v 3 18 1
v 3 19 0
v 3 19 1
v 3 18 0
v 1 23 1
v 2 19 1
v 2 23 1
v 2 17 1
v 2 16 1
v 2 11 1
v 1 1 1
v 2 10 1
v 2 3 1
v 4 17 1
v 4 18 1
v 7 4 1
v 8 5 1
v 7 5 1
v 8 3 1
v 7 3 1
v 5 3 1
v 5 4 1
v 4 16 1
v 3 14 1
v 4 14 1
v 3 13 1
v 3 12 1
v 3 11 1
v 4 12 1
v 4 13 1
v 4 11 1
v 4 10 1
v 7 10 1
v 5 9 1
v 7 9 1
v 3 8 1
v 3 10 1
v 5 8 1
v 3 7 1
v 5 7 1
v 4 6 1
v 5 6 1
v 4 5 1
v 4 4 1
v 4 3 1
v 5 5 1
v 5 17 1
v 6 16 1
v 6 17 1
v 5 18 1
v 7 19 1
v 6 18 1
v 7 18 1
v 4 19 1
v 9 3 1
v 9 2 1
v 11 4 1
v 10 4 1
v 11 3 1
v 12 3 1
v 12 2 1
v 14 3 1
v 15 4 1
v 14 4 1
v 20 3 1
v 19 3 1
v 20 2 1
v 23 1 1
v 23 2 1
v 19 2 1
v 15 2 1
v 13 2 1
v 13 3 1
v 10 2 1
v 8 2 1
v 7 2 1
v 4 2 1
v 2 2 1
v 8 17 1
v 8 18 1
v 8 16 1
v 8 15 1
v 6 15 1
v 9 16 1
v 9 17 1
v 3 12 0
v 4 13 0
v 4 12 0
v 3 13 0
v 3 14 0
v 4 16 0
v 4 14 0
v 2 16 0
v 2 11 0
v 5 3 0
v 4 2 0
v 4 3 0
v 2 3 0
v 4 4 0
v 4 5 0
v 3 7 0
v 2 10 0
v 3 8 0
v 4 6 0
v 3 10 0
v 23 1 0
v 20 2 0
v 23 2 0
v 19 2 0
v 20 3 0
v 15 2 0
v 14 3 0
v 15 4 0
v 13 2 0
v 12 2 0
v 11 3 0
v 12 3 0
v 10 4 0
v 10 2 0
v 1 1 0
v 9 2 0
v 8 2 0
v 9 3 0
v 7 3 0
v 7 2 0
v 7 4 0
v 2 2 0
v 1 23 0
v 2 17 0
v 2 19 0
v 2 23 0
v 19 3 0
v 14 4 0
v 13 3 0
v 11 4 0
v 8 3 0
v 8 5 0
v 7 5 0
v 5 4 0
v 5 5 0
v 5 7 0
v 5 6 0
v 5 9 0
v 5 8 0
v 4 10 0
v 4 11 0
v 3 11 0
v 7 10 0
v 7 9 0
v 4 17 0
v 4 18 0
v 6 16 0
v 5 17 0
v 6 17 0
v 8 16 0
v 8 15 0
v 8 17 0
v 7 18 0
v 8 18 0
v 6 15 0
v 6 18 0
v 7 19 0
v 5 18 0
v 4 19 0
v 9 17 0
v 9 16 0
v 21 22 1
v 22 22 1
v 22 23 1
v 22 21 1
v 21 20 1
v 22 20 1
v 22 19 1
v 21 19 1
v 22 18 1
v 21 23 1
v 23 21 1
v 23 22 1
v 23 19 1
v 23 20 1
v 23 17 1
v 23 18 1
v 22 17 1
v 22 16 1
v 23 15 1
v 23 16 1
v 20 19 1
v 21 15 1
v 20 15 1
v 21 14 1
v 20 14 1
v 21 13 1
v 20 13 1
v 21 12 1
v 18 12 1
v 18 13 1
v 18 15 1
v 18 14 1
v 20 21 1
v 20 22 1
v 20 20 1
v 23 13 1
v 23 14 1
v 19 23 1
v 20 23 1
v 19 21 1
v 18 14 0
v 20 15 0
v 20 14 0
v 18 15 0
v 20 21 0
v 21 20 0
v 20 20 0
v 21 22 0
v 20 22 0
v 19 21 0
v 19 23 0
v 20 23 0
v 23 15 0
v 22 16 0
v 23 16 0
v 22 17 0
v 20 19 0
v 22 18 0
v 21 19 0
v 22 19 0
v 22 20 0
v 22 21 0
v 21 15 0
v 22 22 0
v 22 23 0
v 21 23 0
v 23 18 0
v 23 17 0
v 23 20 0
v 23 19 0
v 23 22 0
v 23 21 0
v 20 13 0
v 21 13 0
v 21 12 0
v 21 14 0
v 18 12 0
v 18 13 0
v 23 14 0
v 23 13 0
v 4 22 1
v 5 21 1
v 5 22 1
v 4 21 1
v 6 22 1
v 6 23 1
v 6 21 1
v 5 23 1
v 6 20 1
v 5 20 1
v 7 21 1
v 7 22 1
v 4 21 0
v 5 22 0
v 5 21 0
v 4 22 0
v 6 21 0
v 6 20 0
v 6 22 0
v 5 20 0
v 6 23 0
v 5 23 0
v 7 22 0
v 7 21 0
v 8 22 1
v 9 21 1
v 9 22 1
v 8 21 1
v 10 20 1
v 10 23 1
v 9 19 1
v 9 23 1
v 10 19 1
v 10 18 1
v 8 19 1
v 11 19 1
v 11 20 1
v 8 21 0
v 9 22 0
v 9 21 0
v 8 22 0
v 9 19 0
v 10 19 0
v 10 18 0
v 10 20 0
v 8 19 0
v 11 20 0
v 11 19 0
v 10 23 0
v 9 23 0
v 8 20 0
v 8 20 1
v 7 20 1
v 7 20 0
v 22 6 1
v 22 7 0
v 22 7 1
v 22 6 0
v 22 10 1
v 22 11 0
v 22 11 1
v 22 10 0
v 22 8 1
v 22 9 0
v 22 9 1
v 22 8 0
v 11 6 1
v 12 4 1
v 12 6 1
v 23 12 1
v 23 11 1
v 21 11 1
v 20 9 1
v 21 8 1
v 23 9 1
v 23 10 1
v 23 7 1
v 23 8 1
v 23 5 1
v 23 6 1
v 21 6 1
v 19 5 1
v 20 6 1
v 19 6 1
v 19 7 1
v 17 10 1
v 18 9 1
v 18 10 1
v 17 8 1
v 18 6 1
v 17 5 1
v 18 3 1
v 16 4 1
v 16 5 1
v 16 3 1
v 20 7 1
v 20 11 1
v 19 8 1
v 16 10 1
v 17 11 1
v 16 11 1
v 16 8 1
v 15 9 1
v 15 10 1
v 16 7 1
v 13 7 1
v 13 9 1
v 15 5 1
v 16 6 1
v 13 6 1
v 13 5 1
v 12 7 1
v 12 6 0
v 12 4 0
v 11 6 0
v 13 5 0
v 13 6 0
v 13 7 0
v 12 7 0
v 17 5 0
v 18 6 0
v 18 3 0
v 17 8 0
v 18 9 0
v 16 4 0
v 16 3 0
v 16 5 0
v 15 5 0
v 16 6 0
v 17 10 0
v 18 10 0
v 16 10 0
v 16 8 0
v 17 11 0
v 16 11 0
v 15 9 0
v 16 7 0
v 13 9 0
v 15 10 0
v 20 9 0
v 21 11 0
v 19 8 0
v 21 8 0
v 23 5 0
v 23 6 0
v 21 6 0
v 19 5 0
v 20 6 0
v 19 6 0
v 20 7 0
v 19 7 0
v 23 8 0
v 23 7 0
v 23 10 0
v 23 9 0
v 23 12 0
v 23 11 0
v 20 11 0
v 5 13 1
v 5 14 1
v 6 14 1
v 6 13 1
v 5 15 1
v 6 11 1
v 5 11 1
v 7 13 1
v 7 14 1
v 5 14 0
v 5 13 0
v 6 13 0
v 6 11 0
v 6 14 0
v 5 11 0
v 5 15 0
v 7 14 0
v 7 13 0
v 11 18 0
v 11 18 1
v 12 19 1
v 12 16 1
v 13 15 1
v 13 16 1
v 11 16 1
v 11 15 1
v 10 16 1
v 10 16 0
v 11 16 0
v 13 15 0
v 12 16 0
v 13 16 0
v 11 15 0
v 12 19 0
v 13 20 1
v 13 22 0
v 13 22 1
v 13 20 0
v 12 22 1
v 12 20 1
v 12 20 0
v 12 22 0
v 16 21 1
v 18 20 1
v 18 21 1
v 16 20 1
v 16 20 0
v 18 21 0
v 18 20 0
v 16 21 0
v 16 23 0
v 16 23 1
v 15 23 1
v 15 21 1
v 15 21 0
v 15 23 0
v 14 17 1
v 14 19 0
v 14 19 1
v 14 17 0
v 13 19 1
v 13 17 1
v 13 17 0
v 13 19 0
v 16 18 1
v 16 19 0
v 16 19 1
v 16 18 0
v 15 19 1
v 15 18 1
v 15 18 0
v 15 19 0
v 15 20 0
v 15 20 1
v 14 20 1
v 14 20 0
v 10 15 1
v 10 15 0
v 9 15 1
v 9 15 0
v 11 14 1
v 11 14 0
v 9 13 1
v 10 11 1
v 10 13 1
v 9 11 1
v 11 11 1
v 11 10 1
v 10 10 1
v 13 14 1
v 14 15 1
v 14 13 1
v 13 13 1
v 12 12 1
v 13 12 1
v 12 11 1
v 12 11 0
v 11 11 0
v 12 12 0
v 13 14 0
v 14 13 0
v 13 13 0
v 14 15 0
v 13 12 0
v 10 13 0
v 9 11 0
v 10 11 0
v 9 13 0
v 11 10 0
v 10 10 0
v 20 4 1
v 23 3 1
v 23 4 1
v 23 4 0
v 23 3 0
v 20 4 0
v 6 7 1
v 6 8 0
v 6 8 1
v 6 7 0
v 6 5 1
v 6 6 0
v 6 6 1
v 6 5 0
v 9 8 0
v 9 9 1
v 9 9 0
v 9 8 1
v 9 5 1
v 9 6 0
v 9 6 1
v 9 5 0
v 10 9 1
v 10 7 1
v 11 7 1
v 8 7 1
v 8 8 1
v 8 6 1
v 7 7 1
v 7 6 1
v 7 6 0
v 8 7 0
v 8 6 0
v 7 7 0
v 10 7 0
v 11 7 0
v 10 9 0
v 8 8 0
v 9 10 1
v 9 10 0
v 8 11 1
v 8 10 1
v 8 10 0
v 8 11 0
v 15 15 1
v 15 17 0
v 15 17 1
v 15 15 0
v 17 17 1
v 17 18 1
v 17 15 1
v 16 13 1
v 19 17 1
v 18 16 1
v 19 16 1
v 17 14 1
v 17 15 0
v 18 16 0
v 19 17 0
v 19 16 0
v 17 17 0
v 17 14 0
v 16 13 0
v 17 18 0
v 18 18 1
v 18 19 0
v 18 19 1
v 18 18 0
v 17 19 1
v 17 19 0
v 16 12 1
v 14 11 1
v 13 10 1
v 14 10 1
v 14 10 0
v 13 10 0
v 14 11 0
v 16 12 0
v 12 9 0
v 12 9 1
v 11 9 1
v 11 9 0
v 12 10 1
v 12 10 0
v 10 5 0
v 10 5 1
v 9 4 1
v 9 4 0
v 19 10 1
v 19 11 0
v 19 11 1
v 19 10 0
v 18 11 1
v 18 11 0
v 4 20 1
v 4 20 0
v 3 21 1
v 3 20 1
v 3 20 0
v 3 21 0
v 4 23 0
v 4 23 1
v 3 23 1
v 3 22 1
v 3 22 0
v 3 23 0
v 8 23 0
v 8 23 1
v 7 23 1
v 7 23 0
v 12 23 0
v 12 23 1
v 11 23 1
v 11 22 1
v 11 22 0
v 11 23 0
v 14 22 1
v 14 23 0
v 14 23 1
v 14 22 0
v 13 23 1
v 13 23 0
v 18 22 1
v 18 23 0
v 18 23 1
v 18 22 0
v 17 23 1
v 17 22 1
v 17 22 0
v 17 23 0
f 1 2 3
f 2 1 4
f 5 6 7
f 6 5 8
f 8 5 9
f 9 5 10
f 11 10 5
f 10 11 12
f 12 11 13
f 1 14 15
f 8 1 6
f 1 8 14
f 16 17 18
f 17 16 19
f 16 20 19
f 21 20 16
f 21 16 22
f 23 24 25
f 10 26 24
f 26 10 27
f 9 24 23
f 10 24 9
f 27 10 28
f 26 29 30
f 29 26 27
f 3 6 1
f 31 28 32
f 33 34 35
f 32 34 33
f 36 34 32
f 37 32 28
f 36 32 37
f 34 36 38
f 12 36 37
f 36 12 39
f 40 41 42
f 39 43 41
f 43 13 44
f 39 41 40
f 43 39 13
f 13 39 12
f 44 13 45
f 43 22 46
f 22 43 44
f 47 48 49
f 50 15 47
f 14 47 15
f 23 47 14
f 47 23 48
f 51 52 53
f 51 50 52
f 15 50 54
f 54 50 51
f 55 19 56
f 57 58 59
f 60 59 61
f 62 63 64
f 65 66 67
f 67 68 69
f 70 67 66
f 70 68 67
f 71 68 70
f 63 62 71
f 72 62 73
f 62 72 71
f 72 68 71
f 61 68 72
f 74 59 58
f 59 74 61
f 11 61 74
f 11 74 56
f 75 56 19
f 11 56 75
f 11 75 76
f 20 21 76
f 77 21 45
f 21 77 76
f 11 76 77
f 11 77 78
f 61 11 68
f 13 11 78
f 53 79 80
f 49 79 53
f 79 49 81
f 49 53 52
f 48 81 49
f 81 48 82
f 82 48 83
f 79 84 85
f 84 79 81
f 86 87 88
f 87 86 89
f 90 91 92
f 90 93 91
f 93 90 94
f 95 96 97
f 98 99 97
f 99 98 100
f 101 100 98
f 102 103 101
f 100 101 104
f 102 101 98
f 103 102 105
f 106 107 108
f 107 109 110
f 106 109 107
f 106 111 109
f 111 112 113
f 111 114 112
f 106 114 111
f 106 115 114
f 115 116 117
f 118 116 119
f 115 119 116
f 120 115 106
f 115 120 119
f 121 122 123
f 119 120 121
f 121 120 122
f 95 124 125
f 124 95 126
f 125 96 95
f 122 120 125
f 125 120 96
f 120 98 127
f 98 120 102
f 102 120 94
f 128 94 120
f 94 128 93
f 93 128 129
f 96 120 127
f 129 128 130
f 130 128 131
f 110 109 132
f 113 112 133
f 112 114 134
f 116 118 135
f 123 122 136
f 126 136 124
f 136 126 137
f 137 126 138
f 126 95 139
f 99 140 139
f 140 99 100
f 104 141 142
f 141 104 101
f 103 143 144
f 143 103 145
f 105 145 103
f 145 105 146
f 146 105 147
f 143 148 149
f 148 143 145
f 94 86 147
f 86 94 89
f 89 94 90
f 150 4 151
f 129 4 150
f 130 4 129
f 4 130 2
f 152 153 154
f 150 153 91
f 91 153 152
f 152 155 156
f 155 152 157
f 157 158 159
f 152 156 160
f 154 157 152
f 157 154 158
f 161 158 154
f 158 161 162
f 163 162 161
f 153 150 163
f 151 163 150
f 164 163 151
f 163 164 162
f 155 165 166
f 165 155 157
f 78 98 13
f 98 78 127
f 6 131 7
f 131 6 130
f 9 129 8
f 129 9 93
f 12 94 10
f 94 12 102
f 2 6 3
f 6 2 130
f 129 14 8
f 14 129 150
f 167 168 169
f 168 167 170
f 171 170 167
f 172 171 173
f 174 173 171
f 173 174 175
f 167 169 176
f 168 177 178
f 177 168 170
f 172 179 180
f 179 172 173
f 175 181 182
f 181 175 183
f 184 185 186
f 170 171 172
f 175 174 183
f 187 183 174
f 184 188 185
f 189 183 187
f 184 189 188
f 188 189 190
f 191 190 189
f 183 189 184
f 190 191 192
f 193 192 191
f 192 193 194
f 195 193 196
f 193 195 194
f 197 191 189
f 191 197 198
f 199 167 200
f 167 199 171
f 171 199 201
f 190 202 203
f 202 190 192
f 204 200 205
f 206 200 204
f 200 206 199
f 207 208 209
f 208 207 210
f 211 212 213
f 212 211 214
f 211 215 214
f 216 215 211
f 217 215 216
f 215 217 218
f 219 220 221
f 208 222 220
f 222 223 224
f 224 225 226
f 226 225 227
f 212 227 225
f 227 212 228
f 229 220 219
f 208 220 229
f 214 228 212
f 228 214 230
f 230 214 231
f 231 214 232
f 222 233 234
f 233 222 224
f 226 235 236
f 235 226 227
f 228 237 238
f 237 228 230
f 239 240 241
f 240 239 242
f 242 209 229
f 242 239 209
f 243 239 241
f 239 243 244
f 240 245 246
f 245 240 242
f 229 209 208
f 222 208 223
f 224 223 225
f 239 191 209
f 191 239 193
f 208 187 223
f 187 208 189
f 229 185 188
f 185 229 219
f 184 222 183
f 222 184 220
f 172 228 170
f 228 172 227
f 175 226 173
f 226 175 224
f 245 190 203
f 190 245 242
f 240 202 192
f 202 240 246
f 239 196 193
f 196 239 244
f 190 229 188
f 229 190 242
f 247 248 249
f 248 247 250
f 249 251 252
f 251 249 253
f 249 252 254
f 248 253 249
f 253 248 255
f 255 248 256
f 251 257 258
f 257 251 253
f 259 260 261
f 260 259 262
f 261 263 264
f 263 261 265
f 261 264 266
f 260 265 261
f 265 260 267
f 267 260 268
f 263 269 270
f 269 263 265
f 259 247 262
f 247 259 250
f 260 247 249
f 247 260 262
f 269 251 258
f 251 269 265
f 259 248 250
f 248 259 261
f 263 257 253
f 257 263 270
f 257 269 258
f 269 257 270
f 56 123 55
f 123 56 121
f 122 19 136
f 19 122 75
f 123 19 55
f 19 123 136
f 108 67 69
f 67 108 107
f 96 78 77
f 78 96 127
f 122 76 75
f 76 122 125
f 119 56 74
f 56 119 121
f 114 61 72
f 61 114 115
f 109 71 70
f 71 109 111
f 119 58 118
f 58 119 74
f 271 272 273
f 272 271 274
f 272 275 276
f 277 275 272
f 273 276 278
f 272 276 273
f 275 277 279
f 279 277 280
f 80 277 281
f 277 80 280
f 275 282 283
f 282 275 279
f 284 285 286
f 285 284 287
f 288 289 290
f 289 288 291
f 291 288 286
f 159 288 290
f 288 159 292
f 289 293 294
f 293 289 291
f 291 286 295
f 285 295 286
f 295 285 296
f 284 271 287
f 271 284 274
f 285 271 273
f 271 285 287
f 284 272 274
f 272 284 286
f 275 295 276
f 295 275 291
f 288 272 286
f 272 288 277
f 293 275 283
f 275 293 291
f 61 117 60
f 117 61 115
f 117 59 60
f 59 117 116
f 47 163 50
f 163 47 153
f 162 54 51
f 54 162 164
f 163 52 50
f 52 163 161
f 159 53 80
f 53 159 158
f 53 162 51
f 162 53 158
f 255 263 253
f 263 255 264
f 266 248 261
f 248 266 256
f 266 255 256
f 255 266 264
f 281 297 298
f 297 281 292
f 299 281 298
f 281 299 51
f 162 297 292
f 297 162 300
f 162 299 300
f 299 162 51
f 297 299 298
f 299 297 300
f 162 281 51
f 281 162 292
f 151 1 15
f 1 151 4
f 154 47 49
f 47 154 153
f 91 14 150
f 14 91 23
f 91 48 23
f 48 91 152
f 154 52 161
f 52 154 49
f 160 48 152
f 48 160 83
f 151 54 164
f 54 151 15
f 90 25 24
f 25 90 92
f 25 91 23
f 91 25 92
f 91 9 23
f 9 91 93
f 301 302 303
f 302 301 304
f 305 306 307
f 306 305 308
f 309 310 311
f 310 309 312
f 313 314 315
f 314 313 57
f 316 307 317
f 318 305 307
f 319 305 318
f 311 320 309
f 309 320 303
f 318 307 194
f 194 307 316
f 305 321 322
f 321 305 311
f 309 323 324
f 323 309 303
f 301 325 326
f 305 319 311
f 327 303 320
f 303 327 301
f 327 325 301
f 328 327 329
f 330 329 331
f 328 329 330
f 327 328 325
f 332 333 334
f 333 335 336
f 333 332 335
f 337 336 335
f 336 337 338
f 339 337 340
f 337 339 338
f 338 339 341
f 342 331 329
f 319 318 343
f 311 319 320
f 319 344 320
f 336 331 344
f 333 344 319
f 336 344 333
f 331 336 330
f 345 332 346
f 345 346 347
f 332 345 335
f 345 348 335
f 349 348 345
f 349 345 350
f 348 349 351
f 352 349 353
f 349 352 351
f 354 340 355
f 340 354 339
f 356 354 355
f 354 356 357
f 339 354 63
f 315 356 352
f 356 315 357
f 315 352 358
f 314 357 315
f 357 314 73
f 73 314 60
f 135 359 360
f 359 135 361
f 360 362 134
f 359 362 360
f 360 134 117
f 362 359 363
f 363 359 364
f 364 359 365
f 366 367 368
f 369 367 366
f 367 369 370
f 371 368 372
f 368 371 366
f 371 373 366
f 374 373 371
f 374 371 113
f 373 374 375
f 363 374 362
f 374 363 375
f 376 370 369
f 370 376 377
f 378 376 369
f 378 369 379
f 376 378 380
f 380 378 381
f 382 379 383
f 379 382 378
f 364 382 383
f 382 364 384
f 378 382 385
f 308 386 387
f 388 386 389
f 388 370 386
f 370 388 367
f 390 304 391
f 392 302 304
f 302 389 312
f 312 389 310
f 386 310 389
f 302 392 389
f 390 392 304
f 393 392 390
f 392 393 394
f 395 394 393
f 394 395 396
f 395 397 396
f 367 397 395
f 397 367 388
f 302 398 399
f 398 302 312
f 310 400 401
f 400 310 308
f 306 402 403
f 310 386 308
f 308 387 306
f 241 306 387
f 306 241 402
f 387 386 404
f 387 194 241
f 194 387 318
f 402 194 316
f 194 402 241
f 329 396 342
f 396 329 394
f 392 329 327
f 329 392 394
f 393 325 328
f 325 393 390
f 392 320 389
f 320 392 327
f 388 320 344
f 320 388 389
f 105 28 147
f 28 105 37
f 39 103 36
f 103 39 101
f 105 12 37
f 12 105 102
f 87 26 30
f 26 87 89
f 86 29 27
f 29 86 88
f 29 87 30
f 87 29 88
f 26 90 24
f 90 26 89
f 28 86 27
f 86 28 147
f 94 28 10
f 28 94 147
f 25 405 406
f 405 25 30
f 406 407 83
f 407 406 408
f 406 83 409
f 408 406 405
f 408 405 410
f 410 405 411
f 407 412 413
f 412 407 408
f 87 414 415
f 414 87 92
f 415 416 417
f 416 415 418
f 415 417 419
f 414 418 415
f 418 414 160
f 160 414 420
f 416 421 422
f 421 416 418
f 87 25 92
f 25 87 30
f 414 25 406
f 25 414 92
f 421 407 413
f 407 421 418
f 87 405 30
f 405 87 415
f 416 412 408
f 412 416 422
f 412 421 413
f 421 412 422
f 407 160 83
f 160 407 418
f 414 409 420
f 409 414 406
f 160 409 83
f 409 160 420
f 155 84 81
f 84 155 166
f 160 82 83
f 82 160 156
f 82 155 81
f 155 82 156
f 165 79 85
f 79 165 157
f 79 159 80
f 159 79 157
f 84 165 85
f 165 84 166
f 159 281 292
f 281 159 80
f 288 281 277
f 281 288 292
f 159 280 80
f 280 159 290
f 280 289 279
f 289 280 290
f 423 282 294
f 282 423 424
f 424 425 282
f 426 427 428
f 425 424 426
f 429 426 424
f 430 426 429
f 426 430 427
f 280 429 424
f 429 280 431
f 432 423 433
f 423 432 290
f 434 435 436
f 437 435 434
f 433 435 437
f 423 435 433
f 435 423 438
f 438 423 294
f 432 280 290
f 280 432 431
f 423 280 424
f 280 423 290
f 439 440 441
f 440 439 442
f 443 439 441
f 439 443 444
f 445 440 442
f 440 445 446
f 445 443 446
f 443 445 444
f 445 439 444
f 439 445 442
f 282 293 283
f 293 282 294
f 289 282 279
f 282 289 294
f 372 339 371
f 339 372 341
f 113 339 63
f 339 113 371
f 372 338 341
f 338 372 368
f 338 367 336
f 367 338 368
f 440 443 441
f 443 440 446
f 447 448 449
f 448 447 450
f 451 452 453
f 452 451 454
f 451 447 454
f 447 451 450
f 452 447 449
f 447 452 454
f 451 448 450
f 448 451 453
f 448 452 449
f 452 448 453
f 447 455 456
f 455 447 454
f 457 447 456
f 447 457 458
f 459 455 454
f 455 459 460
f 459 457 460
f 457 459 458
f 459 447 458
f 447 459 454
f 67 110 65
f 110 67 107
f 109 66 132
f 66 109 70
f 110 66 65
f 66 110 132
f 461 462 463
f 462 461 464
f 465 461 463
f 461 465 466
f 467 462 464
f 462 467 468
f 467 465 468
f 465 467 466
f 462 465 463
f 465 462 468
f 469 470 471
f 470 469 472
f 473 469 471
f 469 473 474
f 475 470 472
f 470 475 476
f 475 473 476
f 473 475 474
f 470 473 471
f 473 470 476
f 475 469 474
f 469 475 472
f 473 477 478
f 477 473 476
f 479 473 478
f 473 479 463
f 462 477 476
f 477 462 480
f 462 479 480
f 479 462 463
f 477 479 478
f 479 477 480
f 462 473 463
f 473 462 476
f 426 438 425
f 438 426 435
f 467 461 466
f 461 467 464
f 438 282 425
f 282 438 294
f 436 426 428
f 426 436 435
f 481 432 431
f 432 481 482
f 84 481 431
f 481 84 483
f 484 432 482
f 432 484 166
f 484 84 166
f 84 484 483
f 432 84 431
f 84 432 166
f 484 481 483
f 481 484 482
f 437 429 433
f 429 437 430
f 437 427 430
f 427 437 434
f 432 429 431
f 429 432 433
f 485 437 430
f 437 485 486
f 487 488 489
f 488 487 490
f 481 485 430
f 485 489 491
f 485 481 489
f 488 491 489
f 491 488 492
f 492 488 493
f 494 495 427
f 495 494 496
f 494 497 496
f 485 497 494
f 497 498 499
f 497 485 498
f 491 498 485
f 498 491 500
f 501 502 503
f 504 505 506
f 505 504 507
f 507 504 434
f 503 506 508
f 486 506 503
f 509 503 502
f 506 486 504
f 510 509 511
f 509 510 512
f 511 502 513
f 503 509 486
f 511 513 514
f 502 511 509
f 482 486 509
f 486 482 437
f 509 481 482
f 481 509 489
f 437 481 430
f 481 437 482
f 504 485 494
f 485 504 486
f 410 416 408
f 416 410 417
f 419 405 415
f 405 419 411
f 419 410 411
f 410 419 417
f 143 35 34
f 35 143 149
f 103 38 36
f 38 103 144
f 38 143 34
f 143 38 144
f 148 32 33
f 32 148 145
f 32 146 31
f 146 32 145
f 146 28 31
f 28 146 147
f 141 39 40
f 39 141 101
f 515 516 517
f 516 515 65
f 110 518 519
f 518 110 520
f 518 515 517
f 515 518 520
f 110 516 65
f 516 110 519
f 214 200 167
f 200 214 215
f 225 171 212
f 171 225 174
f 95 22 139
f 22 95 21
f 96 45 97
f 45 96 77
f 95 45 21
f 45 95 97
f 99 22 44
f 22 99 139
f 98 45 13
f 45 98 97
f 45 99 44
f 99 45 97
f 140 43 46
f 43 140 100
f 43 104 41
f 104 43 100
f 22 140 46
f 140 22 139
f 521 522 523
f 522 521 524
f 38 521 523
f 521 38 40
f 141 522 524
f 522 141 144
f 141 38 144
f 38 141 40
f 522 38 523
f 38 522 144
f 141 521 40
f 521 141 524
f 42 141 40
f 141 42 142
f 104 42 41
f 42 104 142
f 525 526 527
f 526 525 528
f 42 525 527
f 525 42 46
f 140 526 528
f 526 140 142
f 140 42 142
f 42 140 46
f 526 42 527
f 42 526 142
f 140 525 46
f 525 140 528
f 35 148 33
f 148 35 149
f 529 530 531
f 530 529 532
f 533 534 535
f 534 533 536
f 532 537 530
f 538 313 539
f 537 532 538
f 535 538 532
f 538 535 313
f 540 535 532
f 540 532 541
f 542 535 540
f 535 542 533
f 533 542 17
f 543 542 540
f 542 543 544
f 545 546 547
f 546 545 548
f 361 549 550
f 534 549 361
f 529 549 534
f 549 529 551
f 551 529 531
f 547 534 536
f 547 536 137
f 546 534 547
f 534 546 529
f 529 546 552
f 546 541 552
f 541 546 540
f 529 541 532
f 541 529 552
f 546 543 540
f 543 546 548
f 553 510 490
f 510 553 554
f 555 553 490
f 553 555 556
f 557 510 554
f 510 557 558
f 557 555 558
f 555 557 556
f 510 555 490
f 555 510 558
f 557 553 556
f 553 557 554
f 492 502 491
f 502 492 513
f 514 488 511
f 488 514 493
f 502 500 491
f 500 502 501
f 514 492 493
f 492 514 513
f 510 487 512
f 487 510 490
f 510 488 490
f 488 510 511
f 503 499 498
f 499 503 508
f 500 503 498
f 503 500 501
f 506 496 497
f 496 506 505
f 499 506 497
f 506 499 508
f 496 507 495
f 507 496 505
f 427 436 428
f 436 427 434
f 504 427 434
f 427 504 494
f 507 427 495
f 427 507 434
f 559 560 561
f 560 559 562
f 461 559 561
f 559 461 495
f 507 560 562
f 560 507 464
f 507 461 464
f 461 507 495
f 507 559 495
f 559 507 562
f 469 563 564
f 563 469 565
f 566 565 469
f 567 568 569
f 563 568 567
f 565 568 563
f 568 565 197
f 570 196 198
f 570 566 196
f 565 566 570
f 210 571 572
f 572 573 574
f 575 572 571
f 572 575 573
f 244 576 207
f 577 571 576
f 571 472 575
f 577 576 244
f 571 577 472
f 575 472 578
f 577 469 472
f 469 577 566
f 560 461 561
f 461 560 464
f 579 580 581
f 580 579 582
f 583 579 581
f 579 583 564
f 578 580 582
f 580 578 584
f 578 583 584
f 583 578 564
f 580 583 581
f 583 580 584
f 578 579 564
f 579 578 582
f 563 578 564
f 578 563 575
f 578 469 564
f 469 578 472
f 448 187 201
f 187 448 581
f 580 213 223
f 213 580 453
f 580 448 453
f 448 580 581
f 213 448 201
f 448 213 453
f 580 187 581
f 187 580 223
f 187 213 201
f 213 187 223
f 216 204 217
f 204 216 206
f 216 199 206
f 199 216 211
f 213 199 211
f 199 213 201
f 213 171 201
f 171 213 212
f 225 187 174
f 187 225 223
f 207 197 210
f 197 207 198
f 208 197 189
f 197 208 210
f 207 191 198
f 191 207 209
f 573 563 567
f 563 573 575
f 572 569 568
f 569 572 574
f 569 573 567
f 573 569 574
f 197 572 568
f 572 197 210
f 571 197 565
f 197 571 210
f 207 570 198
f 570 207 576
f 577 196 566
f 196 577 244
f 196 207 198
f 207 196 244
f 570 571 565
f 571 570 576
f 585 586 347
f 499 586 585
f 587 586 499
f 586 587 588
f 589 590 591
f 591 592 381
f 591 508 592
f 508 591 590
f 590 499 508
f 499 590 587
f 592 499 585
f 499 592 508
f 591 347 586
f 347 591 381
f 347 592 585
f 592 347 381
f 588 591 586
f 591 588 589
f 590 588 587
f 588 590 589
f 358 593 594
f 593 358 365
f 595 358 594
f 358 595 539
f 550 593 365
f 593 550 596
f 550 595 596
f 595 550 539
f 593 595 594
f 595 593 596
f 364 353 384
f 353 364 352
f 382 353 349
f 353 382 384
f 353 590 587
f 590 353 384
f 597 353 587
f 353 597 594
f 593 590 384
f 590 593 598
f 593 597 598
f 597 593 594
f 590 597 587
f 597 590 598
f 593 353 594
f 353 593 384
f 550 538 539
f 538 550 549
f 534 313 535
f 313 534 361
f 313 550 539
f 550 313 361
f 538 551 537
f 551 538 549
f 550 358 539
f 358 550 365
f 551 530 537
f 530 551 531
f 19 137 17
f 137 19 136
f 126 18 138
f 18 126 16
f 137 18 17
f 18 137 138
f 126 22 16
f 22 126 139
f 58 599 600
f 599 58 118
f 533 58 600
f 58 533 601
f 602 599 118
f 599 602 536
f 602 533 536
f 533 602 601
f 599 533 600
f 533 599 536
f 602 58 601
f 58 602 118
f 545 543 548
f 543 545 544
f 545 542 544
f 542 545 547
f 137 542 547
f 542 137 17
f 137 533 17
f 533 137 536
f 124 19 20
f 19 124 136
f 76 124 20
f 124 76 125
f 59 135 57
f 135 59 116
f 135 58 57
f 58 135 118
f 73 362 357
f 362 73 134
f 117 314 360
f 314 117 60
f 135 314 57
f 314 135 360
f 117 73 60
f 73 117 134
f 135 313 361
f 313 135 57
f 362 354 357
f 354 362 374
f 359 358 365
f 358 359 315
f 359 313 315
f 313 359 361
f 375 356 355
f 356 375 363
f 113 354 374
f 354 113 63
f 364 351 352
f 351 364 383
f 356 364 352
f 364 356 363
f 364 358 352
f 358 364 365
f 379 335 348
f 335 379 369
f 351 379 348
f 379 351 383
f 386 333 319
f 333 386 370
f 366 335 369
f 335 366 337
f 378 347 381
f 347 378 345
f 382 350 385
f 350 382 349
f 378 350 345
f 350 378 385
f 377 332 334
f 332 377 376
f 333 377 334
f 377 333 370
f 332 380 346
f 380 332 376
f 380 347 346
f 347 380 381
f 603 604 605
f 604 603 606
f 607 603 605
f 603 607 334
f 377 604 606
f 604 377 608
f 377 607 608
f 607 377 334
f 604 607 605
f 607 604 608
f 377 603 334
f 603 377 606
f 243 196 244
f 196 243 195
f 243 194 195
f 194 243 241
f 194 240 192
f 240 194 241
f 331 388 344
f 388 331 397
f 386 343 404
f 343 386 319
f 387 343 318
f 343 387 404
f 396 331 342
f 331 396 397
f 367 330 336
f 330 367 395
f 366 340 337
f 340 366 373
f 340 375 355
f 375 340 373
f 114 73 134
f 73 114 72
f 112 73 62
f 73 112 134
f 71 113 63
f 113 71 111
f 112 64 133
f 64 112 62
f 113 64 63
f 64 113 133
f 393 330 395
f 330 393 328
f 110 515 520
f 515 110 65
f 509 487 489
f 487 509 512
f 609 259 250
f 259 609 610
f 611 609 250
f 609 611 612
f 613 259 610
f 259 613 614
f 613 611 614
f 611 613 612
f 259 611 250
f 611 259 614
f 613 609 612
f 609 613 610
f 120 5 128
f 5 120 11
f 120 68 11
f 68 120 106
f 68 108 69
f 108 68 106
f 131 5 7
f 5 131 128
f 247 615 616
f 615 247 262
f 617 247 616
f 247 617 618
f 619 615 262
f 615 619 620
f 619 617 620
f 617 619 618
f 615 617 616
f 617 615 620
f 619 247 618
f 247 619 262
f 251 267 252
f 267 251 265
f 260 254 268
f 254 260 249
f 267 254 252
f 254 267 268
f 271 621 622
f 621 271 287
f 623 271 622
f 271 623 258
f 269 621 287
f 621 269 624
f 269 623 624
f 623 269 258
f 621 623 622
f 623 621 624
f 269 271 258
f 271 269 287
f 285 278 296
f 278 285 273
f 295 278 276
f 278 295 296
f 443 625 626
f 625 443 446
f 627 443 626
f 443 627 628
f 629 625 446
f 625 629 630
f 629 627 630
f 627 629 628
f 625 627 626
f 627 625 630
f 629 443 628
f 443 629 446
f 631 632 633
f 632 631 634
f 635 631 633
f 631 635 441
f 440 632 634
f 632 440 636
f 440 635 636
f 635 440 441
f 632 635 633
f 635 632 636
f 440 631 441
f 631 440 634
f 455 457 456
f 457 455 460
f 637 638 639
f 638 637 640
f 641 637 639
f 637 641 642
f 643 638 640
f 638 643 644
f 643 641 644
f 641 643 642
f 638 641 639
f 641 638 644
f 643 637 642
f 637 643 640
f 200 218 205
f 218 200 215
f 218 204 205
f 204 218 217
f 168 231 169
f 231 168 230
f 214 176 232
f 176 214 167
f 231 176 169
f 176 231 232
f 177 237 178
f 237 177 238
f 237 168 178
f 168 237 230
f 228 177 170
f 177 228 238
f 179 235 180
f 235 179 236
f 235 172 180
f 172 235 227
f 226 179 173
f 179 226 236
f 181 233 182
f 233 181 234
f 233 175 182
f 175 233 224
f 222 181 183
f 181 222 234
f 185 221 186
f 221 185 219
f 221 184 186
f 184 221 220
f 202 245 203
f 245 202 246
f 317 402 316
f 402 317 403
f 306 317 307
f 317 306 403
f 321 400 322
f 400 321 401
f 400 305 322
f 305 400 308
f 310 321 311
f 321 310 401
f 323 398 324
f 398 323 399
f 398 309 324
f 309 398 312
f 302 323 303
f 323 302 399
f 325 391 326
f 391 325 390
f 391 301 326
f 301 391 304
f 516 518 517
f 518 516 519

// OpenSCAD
// file: ../../util/bitmap.scad
/*****************************************************************************
 * Module Bitmap Library
 * Modules to create bitmaps of unit squares from 1 or 2 dimensional vectors.
 *****************************************************************************
 * Copyright 2017 Chris Baker
 *
 * This program is free software: you can redistribute it and/or modify
 * it under the terms of the GNU Lesser General Public License as published by
 * the Free Software Foundation, either version 3 of the License, or
 * (at your option) any later version.
 *
 * This program is distributed in the hope that it will be useful,
 * but WITHOUT ANY WARRANTY; without even the implied warranty of
 * MERCHANTABILITY or FITNESS FOR A PARTICULAR PURPOSE.  See the
 * GNU Lesser General Public License for more details.
 *
 * You should have received a copy of the GNU Lesser General Public License
 * along with this program.  If not, see <http://www.gnu.org/licenses/>.
 *****************************************************************************
 * Usage:
 * Include this file with the "use" tag.
 * Depends on compat.scad library.
 *
 * API:
 *   1dbitmap(bitmap, center, expansion, vector_mode)
 *   2dbitmap(bitmap, center, expansion, vector_mode)
 *     Generate a 1 or 2-Dimensional field of modules based on the provided
 *     bitmap vector. See Bitmap Vectors below.
 *     The center flag determines whether to center the bitmap on the origin.
 *     The expansion value actually shrinks each cube in the x and y
 *     dimension by the specified amount.
 *     The vector_mode flag determines whether to create 3D solid geometry
 *     (unit cubes) or 2D vector geometry (squares).
 *
 * Bitmap Vectors:
 *   The bitmap vectors primarily provide boolean information.
 *   A module will be placed where these vectors have a postive value and
 *   skipped where they have a negative value. I.E. 0, -1, false, and undef
 *   are all equivalent and result in a skip. 1 and true are equivalent and
 *   result in a placed 1-unit module.
 *   Further, if the value is an integer it will be treated as a height for
 *   the module, allowing z-maps to be created.
 *   If the value is not an integer or boolean, it will be treated as a color
 *   reference. This can be a string or RGBA vector that will be used to
 *   color the module in the OpenSCAD preview window.
 *   In current versions of OpenSCAD, the color has no effect in the rendered
 *   view or STL output.
 *
 * Vector Mode:
 *   Although OpenSCAD supports generating 2D geometry, there are several
 *   caveats:
 *   - 2D and 3D geometry cannot be mixed
 *   - Extruding 2D geometry causes color information to be lost
 *   - All 2D geometry is projected onto the XY plane when rendering
 *   - Rendering also results in loss of color (same as 3D)
 *   - The SVG exporter is somewhat limited:
 *     - The pixel size of the image is hard-coded in the file
 *     - The title of the image is a generic string
 *     - The color selection for stroke and fill is fixed
 *     - The stroke-width is set to a large value that will cause overlap
 *     - The background is transparent
 *     - Only one path element is created with all of the geometry; there is
 *       no easy way to split up the geometry into multiple logical units.
 *     - These issues can mostly be resolved by hand-editing the file:
 *       - Remove or modify the width and height parameters from the svg
 *         element at the top of the file to provide better scaling.
 *       - Edit the title element at the top of the file to change the title.
 *       - Edit the stroke and fill parameters of the path element (these will
 *         probably be at the end of the file).
 *       - Set the stroke-width parameter for the path element to 0.
 *****************************************************************************/
use <compat.scad>

/*
 * 2dbitmap - Turn a 2D vector into a bitmap of cubes
 *
 * bitmap - 2D vector representing where to place each cube
 *          Value can either be boolean, z-height, or color
 * center - center cubes around the origin
 * expansion - size of gap around each pixel (screendoor)
 * vector_mode - create a 2D vector drawing instead of 3D extrusion
 */
module 2dbitmap(bitmap=[[1,0],[0,1]], center=false, expansion=0, vector_mode=false)
{
	ylen=len(bitmap)-1;

	for (y=[0:ylen]) {
		xlen=len(bitmap[y])-1;
		for (x=[0:xlen])
			translate([x-(center?xlen/2:0),ylen-y-(center?ylen/2:0),0])
				if (is_indexable(bitmap[y][x]))
					color(bitmap[y][x])
						if (vector_mode)
							square([1-expansion,1-expansion], center=center);
						else
							cube([1-expansion,1-expansion,1], center=center);
				else
					if (bitmap[y][x])
						if (vector_mode)
							square([1-expansion,1-expansion], center=center);
						else
							cube([1-expansion,1-expansion,clamp_nonnum(bitmap[y][x])], center=center);
	}
}

module 1dbitmap(bitmap=[1,0,1,0,1], center=false, expansion=0, vector_mode=false)
	2dbitmap([bitmap], center, expansion, vector_mode);

/*
 * Examples
 */

// 1D with z-height
translate([10,0,0]) scale([1,10,1])
	1dbitmap(bitmap=[1,1,0,2,0,0,3], expansion=.1);

// 1D with boolean
translate([-20,0,0]) scale([1,10,1])
	1dbitmap(bitmap=[true,false,true,false,true,true]);

// 2D with z-height
scale([2,2,1])
	2dbitmap(bitmap=[[1,0,2,1],[0,3,3,0],[1,1,0,1]],
		center=true);

// 1D with color
translate([0,-10,0]) scale([1,3,1])
	1dbitmap(bitmap=["red","white","blue",[0,0.3,0,0.5]]);

// 1D with color using 2D-vector-mode
translate([-7,-8,0]) scale([1,2])
	1dbitmap(bitmap=["red",0,"blue",0,"green"], vector_mode=true);
translate([-4.5,-10,0]) scale([1,2])
	1dbitmap(bitmap=["red",0,"blue",0,"green"], vector_mode=true, center=true);
// file: ../../util/bitlib.scad
/*****************************************************************************
 * Bit Manipulation Library
 * Provides some useful bit manipulation functions.
 *****************************************************************************
 * Copyright 2017 Chris Baker
 *
 * This program is free software: you can redistribute it and/or modify
 * it under the terms of the GNU Lesser General Public License as published by
 * the Free Software Foundation, either version 3 of the License, or
 * (at your option) any later version.
 *
 * This program is distributed in the hope that it will be useful,
 * but WITHOUT ANY WARRANTY; without even the implied warranty of
 * MERCHANTABILITY or FITNESS FOR A PARTICULAR PURPOSE.  See the
 * GNU Lesser General Public License for more details.
 *
 * You should have received a copy of the GNU Lesser General Public License
 * along with this program.  If not, see <http://www.gnu.org/licenses/>.
 *****************************************************************************
 * Usage:
 * Include this file with the "use" tag.
 * When run on its own, all echo statements in this
 * library should print "true".
 *
 * API:
 *   bit(v,b)
 *     Return the truth value of the b'th bit of v.
 *
 *   check_bit_size(v,b,signed=false)
 *     Determine whether the value v can be represented
 *     with b bits (b must be positive).
 *     The signed flag indicates whether to include the
 *     sign bit in the determination; otherwise negative
 *     values will result in undef being returned.
 *
 *   xor(a,b)
 *     Return the value of a xor b.
 *     Handles arbitrary size values for a and b.
 *     Handles negative values as expected (a positive
 *     result will be returned unless a and b have
 *     differing signs).
 *
 * TODO:
 *  - Change echos to asserts (future OpenSCAD version)
 *  - Add more functions
 *
 *****************************************************************************/

//Return the truth value of the b'th bit of v
function bit(v,b) =
	((v==undef)||(b==undef)||(b<0))?undef:
	(floor(v / pow(2, b)) % 2)?true:false;

echo("*** bit() testcases ***");
echo(0,bit(0,0)==false);
echo(1,bit(-1,0)==true);
echo(2,bit(1,0)==true);
echo(3,[for (i=[0:63]) bit(0,i)]==[for (i=[0:63]) false]); //0=0...0
echo(4,[for (i=[0:63]) bit(-1,i)]==[for (i=[0:63]) true]); //-1=1...1
echo(5,[for (i=[1:63]) bit(1,i)]==[for (i=[1:63]) false]); //1=0...01
echo(6,[for (i=[0:7]) bit(85,i)?1:0]==[1,0,1,0,1,0,1,0]); //85=01010101
echo(7,[for (i=[0:7]) bit(170,i)?1:0]==[0,1,0,1,0,1,0,1]); //170=10101010
echo(8,[for (i=[0:7]) bit(165,i)?1:0]==[1,0,1,0,0,1,0,1]); //165=10100101
echo(9,[for (i=[0:7]) bit(56,i)?1:0]==[0,0,0,1,1,1,0,0]); //56=00111000
echo(10,[for (i=[0:7]) bit(-3,i)?1:0]==[1,0,1,1,1,1,1,1]); //-3=1...101
//(2^64)=0...01 0...0
echo(11,bit(pow(2,64),64)==true);
echo(12,[for (i=[0:63]) bit(pow(2,64),i)]==[for (i=[0:63]) false]);
echo(13,[for (i=[65:127]) bit(pow(2,64),i)]==[for (i=[1:63]) false]);
//-(2^64)=1...1 0...0
echo(14,[for (i=[0:63]) bit(-pow(2,64),i)]==[for (i=[0:63]) false]);
echo(15,[for (i=[64:127]) bit(-pow(2,64),i)]==[for (i=[0:63]) true]);
echo(16,bit(10,-1)==undef);
echo(17,bit(10,undef)==undef);
echo(18,bit(undef,3)==undef);

//return true if v can be represented in b bits
//if signed flag is set. the result will be adjusted
//to account for the needed sign bit
function check_bit_size(v,b,signed=false) =
	(b<0)?undef:
	(v==undef)?undef:
	(b==0)?false:
	(v==0)?true: //(b>0)
	(signed)?
		(v<0)?(-pow(2,b-1)<(v+1)):
			(pow(2,b-1)>(v+1)):
		(v<0)?undef:
			(pow(2,b)>v);

echo("*** check_bit_size() testcases ***");
echo(0,check_bit_size(-1,2)==undef);
echo(1,check_bit_size(2,-4)==undef);
echo(2,check_bit_size(2,-4,signed=true)==undef);
echo(3,check_bit_size(0,0)==false);
echo(4,check_bit_size(0,1)==true);
echo(5,check_bit_size(1,0)==false);
echo(6,check_bit_size(1,1)==true);
echo(7,check_bit_size(7,3)==true);
echo(8,check_bit_size(8,3)==false);
echo(9,check_bit_size(1,3)==true);
echo(10,check_bit_size(256,8)==false);
echo(11,check_bit_size(255,8)==true);
echo(12,check_bit_size(10,2)==false);
echo(13,check_bit_size(10,4)==true);
echo(14,check_bit_size(-10,2,signed=true)==false);
echo(15,check_bit_size(-10,4,signed=true)==false);
echo(16,check_bit_size(-10,5,signed=true)==true);
echo(17,check_bit_size(-1,0,signed=true)==false);
echo(18,check_bit_size(-1,1,signed=true)==true);
echo(19,check_bit_size(0,0,signed=true)==false);
echo(20,check_bit_size(0,1,signed=true)==true);
echo(21,check_bit_size(-2,2,signed=true)==true);
echo(22,check_bit_size(-3,2,signed=true)==false);
echo(23,check_bit_size(-3,3,signed=true)==true);
echo(24,check_bit_size(-8,3,signed=true)==false);
echo(25,check_bit_size(-8,4,signed=true)==true);
echo(26,check_bit_size(undef,4)==undef);
echo(27,check_bit_size(undef,4,signed=true)==undef);

//return the value of a xor b
//runs recursively until all bits of a and b are exhausted
function xor(a,b,i=0) =
	((a==undef)||(b==undef))?undef:
	let (c=bit(a,i), d=bit(b,i),
		 v=((c||d) && !(c&&d))?pow(2,i):0)
		(check_bit_size(a,i,signed=true) &&
		 check_bit_size(b,i,signed=true))?
			-v: //special case for sign bit
			v+xor(a,b,i+1); //recursively add powers of 2

echo("*** xor() testcases ***");
echo(0,xor(42,0)==42);
echo(1,xor(42,42)==0);
echo(2,xor(169,238)==71); //10101001^11101110=01000111=71
echo(3,xor(238,169)==71);
echo(4,xor(42,238)==196); //00101010^11101110=11000100=196
echo(5,xor(169,42)==131); //10101001^00101010=10000011=131
echo(6,xor(-8,-10)==14); //11000^10110=01110=14
echo(7,xor(-7,-10)==15); //11001^10110=01111=15
echo(8,xor(9,-10)==-1); //01001^10110=11111=-1
echo(9,xor(9,-12)==-3); //01001^10100=11101=-3
echo(10,xor(undef,0)==undef);
// file: ../../util/stringlib.scad
/*****************************************************************************
 * String Manipulation Library
 * Provides some useful string manipulation functions.
 *****************************************************************************
 * Copyright 2017 Chris Baker
 *
 * This program is free software: you can redistribute it and/or modify
 * it under the terms of the GNU Lesser General Public License as published by
 * the Free Software Foundation, either version 3 of the License, or
 * (at your option) any later version.
 *
 * This program is distributed in the hope that it will be useful,
 * but WITHOUT ANY WARRANTY; without even the implied warranty of
 * MERCHANTABILITY or FITNESS FOR A PARTICULAR PURPOSE.  See the
 * GNU Lesser General Public License for more details.
 *
 * You should have received a copy of the GNU Lesser General Public License
 * along with this program.  If not, see <http://www.gnu.org/licenses/>.
 *****************************************************************************
 * Usage:
 * Include this file with the "use" tag.
 * When run on its own, all echo statements in this library should print
 * "true".
 *
 * API:
 *   atoi(a)
 *     Convert the string of numerals, a, to a vector of individual decimal
 *     numbers.
 *
 *   ascii_to_vec(a)
 *     Convert the ASCII string, a, into a vector of decimal numbers.
 *
 * TODO:
 *  - Change echos to asserts (future OpenSCAD version)
 *
 *****************************************************************************/

/*
 * atoi - convert ASCII numerals to a vector of individual decimal numbers
 *
 * a - the ASCII string of numerals
 */
function atoi(a) = (len(a)==undef)?undef:
[
	let (val = search(a, "0123456789"))
		for (i = val) i
];

echo("*** atoi() testcases ***");
echo(ascii_to_vec(undef)==undef);
echo(ascii_to_vec(true)==undef);
echo(ascii_to_vec(false)==undef);
echo(ascii_to_vec("")==[]);
echo(atoi("0")==[0]);
echo(atoi("1")==[1]);
echo(atoi("2")==[2]);
echo(atoi("3")==[3]);
echo(atoi("4")==[4]);
echo(atoi("5")==[5]);
echo(atoi("6")==[6]);
echo(atoi("7")==[7]);
echo(atoi("8")==[8]);
echo(atoi("9")==[9]);
echo(atoi("123")==[1,2,3]);
echo(atoi("1a23b")==[1,2,3]); //degenerate case, don't really care too much about the result

/*
 * ascii_to_vec - convert ASCII string to decimal vector
 *
 * a - the ASCII string to vectorize
 */
function ascii_to_vec(a) = (len(a)==undef)?undef:
[
	let (val = search(a, "\x01\x02\x03\x04\x05\x06\x07\x08\x09\x0a\x0b\x0c\x0d\x0e\x0f\x10\x11\x12\x13\x14\x15\x16\x17\x18\x19\x1a\x1b\x1c\x1d\x1e\x1f !\"#$%&'()*+,-./0123456789:;<=>?@ABCDEFGHIJKLMNOPQRSTUVWXYZ[\\]^_`abcdefghijklmnopqrstuvwxyz{|}~\x7f"))
		for (i = val) i+1
];

echo("*** ascii_to_vec() testcases ***");
echo(ascii_to_vec(undef)==undef);
echo(ascii_to_vec(true)==undef);
echo(ascii_to_vec(false)==undef);
echo(ascii_to_vec("")==[]);
echo(ascii_to_vec("0")==[48]);
echo(ascii_to_vec("a")==[97]);
echo(ascii_to_vec("0123456789")==[48,49,50,51,52,53,54,55,56,57]);
echo(ascii_to_vec("The quick brown fox jumped over the lazy dog.")
	==[84,104,101,32,113,117,105,99,107,32,98,114,111,119,110,32,102,111,120,32,106,117,109,112,101,100,32,111,118,101,114,32,116,104,101,32,108,97,122,121,32,100,111,103,46]);
// main file
/* Unit Test 10: 22x22 - 30 data bytes, 20 ecc bytes - dm_pad example */
/* This is the same as unit test 9 but using expert_mode with dm_pad(). */
use <../datamatrix.scad>
use <../../util/datamatrix-util.scad>
data_matrix(
	dm_ecc(
		dm_pad(
			concat(
				text_mode(),
				dm_text("Wikipedia, the free encyclopedi"),
				ascii_mode(),
				dm_ascii("a")
			)
		)
	),
	mark="black", expert_mode=true);
